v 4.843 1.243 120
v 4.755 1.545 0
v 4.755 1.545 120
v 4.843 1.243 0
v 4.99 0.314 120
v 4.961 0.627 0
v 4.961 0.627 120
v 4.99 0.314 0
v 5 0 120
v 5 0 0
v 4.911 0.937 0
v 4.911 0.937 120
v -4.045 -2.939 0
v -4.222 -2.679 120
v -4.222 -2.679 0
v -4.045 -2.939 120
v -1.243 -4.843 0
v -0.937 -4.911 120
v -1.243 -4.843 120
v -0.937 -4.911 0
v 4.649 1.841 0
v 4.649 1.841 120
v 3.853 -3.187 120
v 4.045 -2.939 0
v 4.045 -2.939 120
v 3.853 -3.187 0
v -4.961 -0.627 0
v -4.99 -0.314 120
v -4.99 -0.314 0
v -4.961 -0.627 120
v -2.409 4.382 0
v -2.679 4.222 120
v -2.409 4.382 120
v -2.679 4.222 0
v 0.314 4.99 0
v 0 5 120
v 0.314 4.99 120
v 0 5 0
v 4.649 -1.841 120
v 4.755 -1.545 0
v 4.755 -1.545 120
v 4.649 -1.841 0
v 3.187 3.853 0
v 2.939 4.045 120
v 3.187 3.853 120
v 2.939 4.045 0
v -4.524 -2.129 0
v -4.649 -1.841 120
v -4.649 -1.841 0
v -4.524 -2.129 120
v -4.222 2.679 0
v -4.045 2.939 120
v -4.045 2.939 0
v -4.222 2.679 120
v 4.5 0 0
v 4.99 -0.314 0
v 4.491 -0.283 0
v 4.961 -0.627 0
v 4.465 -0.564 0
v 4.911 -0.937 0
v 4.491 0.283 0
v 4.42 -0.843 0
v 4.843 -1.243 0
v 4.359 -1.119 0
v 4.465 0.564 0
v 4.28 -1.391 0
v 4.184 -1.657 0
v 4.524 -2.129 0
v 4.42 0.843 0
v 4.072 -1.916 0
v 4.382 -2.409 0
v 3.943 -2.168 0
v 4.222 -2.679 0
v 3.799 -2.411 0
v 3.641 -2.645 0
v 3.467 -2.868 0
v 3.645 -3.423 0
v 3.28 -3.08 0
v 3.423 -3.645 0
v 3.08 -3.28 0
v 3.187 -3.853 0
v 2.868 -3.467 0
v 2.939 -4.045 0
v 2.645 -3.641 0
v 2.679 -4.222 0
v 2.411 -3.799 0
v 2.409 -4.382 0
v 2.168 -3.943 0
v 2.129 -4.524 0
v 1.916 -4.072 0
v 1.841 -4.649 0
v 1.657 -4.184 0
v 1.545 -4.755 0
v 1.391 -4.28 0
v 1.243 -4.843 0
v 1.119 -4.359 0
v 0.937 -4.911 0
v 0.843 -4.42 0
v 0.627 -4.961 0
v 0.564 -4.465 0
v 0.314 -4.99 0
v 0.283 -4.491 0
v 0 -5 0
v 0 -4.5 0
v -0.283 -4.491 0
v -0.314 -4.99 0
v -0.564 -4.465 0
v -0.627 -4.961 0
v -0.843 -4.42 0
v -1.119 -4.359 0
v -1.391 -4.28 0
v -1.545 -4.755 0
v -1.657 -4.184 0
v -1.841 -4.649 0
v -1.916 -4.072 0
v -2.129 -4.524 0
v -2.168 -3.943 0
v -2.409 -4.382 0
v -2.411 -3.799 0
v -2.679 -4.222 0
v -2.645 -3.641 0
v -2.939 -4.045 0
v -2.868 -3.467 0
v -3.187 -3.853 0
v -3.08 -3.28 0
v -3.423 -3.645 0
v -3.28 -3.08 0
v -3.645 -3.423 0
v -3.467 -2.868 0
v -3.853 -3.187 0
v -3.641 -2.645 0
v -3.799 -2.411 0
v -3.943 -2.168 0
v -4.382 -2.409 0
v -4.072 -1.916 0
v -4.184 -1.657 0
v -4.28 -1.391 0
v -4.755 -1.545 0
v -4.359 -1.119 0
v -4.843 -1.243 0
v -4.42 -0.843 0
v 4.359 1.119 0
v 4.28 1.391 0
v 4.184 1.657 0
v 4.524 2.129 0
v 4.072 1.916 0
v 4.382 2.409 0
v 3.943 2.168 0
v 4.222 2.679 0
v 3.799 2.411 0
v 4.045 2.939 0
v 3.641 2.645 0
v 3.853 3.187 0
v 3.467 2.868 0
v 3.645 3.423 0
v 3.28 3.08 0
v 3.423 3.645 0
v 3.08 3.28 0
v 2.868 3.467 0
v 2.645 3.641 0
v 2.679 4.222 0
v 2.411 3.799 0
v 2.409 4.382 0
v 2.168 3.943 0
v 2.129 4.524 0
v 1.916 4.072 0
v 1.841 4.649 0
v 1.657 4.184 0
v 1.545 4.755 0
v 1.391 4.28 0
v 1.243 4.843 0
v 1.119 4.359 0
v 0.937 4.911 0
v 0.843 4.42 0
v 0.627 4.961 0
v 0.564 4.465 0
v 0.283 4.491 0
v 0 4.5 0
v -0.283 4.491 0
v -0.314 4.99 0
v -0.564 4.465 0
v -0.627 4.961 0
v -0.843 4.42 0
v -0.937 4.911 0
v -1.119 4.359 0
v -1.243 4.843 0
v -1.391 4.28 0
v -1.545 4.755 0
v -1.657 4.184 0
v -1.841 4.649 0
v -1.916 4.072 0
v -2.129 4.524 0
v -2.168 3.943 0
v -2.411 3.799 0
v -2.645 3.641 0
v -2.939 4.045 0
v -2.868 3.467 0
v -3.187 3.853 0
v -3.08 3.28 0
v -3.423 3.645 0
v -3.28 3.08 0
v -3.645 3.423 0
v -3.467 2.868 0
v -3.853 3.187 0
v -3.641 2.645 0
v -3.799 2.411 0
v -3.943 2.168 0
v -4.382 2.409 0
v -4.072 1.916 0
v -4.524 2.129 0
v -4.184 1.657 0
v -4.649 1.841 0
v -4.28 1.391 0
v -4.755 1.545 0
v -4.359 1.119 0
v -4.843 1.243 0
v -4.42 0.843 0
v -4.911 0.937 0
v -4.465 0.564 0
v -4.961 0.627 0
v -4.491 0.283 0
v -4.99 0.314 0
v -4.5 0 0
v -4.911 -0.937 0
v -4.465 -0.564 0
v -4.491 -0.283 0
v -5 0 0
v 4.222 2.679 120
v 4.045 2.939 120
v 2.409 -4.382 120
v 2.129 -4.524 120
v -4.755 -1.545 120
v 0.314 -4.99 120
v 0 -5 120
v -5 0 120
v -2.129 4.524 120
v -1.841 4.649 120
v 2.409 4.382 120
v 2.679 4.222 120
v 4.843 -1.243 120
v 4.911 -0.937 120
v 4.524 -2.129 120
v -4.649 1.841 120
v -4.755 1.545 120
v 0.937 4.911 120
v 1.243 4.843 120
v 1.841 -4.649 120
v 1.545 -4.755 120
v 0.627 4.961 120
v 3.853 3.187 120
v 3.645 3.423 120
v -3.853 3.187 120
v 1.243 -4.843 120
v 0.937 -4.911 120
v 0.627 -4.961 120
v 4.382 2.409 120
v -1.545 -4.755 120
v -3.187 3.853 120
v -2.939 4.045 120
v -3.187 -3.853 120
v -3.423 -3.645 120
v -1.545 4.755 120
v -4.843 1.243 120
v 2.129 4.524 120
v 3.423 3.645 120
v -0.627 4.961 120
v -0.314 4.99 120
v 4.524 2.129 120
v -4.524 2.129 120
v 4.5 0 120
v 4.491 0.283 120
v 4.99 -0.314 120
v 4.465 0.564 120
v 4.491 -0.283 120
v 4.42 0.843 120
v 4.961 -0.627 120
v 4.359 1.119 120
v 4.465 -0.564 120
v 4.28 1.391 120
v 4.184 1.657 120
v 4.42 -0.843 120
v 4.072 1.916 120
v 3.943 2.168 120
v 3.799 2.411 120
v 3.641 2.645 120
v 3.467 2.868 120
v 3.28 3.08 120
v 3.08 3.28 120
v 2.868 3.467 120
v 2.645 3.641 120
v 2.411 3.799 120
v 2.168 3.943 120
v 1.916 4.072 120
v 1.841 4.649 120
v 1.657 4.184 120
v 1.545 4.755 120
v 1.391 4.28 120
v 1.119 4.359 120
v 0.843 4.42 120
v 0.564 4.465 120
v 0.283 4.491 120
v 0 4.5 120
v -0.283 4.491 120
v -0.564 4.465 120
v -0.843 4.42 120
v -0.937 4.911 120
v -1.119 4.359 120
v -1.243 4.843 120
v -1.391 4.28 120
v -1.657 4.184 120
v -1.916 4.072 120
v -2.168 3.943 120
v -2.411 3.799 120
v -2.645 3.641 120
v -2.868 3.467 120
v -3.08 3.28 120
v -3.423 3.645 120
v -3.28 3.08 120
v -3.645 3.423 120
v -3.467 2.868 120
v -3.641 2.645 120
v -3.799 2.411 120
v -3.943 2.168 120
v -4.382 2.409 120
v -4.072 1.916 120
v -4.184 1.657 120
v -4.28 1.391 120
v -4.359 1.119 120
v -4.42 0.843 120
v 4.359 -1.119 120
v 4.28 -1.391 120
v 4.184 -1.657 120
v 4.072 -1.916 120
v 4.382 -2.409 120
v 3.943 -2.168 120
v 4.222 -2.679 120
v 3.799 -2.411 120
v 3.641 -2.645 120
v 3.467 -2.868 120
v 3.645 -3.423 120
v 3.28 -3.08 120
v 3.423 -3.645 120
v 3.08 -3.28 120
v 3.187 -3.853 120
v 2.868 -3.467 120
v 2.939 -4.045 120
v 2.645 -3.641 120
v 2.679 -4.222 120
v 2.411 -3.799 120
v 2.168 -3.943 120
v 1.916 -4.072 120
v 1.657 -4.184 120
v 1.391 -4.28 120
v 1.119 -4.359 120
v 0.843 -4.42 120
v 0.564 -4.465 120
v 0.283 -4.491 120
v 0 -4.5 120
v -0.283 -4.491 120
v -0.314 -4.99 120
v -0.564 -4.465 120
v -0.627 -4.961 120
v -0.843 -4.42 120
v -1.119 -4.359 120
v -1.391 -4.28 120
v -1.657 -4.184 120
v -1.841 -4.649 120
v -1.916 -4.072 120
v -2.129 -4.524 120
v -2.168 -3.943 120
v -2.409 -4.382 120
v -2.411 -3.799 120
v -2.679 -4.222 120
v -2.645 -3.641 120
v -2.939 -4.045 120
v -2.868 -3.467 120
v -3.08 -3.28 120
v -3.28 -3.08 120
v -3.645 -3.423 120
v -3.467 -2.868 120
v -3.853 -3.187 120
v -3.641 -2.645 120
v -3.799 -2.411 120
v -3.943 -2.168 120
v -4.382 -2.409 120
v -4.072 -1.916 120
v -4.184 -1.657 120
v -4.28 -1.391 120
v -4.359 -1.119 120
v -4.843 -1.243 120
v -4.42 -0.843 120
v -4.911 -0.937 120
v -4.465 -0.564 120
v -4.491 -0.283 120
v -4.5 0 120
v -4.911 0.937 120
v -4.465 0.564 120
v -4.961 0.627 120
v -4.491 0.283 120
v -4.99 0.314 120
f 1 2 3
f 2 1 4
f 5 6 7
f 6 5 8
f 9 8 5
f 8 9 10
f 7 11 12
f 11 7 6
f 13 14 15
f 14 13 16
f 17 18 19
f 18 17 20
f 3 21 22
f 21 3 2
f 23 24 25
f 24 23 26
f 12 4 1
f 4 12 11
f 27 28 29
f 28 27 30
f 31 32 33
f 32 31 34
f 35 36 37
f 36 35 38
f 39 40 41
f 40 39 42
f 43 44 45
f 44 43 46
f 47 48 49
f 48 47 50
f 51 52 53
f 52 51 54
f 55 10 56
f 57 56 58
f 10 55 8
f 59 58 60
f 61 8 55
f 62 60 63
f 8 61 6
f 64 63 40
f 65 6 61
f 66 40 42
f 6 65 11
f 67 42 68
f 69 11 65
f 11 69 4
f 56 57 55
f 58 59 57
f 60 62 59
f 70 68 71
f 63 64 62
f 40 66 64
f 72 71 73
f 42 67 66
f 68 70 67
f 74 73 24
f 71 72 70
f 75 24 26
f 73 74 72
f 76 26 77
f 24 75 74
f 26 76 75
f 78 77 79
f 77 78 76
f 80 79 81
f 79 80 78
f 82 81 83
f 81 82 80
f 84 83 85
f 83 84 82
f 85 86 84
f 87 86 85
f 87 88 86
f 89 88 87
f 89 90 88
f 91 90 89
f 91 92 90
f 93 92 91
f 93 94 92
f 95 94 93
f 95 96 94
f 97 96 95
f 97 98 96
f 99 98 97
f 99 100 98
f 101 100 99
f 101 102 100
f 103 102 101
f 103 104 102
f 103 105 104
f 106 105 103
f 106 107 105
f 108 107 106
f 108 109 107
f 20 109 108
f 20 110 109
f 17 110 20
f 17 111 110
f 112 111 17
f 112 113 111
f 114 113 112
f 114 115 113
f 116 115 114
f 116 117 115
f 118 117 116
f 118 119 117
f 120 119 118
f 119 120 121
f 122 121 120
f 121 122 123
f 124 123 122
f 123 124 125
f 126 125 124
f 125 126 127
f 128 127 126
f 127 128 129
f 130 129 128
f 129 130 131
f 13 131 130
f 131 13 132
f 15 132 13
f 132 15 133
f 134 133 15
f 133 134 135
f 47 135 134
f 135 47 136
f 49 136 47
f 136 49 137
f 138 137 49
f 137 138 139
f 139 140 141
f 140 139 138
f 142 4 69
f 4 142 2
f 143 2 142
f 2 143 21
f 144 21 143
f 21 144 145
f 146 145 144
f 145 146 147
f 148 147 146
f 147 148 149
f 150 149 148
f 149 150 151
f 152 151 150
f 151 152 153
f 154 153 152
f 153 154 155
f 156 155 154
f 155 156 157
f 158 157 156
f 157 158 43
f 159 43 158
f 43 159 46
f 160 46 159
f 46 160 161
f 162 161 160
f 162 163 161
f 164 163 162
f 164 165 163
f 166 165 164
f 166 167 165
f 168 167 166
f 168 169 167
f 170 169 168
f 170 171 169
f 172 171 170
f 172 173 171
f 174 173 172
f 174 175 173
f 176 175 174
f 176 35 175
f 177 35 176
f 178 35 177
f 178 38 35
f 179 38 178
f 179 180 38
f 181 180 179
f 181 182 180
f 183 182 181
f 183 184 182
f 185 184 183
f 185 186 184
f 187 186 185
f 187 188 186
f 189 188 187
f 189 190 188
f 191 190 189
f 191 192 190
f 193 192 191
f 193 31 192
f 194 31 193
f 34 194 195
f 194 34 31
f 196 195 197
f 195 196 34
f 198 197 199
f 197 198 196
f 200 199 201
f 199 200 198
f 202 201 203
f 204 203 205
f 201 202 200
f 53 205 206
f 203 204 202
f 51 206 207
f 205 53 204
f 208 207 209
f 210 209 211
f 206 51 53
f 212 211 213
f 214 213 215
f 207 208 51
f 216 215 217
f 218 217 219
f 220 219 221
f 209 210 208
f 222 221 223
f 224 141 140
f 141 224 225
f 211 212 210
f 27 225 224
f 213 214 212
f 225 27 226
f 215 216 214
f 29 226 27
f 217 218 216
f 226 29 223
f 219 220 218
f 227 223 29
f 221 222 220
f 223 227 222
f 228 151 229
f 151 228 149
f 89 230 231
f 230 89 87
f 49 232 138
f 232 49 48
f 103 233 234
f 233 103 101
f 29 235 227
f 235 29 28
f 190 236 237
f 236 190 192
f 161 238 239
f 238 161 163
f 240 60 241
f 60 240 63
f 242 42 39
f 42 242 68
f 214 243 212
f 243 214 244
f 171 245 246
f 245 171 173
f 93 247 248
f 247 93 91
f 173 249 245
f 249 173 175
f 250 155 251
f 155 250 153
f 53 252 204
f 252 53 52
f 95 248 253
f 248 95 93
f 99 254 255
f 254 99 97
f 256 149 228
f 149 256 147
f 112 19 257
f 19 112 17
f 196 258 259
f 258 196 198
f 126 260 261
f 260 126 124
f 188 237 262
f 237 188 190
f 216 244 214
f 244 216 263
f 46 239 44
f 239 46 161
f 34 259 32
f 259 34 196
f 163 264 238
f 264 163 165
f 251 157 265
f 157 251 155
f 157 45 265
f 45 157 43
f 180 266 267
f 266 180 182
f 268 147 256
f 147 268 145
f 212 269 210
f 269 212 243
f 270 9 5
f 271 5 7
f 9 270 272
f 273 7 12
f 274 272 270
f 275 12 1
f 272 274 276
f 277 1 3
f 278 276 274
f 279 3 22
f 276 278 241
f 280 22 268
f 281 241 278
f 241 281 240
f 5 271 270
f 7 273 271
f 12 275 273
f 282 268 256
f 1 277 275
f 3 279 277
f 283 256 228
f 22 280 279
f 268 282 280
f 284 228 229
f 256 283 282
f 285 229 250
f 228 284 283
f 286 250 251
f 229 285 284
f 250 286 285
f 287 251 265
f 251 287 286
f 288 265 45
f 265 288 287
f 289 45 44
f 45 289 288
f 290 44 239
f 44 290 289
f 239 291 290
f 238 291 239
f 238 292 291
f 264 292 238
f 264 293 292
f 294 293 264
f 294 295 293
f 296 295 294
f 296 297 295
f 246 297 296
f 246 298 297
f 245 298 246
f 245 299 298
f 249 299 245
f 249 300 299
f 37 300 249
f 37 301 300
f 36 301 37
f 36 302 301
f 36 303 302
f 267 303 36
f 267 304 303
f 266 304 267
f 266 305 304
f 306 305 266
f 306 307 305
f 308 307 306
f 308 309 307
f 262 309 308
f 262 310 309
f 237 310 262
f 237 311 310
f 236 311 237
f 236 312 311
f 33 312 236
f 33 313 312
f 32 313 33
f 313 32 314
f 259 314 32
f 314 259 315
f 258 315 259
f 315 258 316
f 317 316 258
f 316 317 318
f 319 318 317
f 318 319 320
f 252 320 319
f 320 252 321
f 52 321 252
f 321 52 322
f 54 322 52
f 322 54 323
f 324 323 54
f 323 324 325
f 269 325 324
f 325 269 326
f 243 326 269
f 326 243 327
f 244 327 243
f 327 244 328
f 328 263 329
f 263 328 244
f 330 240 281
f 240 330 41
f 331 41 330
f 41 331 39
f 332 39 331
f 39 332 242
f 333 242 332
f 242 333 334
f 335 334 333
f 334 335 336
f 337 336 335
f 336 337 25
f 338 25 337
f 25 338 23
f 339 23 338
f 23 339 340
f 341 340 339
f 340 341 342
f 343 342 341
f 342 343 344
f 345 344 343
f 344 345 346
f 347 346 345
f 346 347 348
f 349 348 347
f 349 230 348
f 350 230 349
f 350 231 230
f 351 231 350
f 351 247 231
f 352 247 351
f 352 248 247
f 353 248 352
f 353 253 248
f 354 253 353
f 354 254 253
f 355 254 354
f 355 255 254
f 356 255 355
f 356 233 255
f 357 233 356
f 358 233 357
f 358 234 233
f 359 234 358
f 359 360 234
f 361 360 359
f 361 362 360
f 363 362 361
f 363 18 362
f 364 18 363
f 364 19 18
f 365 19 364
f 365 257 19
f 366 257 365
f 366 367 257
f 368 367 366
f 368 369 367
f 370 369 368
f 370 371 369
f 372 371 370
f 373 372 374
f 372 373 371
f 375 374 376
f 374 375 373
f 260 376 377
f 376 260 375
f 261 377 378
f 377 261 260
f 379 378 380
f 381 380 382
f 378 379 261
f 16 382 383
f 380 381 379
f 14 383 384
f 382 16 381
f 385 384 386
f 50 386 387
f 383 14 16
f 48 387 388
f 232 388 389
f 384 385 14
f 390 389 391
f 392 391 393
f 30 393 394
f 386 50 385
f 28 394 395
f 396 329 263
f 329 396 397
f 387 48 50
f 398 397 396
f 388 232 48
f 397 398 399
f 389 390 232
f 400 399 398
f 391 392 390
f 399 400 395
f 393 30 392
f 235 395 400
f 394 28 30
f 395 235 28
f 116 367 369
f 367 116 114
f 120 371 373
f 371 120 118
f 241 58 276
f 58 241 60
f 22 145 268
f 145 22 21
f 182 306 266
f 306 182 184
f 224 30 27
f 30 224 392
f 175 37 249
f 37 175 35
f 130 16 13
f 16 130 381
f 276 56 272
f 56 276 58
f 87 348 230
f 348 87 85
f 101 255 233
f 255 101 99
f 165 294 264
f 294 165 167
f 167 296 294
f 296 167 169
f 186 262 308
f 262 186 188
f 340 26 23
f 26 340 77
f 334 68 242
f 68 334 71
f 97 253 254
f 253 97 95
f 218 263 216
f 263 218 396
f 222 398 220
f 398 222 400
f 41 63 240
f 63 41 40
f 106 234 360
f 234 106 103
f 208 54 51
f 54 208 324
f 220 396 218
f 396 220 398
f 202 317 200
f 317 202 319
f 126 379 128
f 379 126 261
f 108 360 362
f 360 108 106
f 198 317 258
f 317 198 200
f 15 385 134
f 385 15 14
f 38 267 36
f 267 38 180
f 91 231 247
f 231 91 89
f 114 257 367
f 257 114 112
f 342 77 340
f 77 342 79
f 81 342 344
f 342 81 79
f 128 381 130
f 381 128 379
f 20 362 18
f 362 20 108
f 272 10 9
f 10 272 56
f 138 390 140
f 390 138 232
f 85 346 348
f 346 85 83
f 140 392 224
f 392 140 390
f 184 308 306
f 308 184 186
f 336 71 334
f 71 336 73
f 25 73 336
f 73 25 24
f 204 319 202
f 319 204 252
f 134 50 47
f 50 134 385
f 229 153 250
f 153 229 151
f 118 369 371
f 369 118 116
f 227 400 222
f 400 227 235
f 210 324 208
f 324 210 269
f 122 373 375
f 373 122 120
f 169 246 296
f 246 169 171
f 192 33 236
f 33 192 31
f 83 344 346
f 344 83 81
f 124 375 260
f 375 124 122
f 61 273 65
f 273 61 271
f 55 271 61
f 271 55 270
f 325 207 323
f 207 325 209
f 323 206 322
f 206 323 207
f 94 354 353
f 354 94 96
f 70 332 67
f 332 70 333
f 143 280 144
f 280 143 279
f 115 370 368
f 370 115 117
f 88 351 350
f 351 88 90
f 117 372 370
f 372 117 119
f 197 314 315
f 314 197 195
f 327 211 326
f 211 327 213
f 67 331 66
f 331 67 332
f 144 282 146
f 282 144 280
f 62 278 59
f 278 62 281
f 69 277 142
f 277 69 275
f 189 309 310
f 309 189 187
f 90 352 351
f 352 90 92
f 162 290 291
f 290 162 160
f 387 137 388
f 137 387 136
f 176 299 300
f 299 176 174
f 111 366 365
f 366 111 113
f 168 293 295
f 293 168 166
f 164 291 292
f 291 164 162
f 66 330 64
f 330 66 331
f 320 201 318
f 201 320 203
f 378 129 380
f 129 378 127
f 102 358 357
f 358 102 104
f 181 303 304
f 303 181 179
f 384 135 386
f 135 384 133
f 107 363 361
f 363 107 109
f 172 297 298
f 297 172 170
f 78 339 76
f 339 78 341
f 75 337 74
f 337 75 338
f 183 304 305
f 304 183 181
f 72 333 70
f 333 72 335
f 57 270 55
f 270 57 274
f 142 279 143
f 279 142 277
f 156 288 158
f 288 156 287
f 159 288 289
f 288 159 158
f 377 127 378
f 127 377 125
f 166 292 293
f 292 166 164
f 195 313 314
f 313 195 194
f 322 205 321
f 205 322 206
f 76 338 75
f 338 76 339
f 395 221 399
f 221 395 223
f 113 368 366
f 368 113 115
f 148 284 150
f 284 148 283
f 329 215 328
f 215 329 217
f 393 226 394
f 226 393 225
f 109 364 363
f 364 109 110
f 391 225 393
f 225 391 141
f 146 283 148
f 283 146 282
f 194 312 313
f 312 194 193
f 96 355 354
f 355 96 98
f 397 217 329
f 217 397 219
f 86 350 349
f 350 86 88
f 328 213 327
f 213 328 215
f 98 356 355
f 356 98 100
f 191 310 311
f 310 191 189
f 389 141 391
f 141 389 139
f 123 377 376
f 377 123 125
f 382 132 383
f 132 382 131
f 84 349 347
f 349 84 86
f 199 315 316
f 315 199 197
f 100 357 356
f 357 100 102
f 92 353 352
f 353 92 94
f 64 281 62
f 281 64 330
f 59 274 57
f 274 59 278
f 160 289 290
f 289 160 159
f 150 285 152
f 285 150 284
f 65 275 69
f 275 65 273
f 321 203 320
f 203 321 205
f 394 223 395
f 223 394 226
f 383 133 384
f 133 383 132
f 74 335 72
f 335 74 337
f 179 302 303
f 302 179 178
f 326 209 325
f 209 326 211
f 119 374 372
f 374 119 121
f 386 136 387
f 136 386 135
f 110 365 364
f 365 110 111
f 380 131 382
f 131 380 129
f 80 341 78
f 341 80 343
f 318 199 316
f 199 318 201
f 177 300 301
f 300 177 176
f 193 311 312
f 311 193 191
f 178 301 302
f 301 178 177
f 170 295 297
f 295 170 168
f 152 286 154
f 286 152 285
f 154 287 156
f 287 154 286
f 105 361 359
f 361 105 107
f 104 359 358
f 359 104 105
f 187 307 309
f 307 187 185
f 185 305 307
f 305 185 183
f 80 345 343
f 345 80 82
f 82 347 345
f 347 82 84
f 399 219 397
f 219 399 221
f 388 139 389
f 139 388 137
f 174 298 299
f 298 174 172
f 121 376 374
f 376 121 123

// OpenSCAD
difference()
{
cylinder(
	d=10,
	h=120,
	$fn=100
);
cylinder(
	d=9,
	h=120,
	$fn=100
);
}
